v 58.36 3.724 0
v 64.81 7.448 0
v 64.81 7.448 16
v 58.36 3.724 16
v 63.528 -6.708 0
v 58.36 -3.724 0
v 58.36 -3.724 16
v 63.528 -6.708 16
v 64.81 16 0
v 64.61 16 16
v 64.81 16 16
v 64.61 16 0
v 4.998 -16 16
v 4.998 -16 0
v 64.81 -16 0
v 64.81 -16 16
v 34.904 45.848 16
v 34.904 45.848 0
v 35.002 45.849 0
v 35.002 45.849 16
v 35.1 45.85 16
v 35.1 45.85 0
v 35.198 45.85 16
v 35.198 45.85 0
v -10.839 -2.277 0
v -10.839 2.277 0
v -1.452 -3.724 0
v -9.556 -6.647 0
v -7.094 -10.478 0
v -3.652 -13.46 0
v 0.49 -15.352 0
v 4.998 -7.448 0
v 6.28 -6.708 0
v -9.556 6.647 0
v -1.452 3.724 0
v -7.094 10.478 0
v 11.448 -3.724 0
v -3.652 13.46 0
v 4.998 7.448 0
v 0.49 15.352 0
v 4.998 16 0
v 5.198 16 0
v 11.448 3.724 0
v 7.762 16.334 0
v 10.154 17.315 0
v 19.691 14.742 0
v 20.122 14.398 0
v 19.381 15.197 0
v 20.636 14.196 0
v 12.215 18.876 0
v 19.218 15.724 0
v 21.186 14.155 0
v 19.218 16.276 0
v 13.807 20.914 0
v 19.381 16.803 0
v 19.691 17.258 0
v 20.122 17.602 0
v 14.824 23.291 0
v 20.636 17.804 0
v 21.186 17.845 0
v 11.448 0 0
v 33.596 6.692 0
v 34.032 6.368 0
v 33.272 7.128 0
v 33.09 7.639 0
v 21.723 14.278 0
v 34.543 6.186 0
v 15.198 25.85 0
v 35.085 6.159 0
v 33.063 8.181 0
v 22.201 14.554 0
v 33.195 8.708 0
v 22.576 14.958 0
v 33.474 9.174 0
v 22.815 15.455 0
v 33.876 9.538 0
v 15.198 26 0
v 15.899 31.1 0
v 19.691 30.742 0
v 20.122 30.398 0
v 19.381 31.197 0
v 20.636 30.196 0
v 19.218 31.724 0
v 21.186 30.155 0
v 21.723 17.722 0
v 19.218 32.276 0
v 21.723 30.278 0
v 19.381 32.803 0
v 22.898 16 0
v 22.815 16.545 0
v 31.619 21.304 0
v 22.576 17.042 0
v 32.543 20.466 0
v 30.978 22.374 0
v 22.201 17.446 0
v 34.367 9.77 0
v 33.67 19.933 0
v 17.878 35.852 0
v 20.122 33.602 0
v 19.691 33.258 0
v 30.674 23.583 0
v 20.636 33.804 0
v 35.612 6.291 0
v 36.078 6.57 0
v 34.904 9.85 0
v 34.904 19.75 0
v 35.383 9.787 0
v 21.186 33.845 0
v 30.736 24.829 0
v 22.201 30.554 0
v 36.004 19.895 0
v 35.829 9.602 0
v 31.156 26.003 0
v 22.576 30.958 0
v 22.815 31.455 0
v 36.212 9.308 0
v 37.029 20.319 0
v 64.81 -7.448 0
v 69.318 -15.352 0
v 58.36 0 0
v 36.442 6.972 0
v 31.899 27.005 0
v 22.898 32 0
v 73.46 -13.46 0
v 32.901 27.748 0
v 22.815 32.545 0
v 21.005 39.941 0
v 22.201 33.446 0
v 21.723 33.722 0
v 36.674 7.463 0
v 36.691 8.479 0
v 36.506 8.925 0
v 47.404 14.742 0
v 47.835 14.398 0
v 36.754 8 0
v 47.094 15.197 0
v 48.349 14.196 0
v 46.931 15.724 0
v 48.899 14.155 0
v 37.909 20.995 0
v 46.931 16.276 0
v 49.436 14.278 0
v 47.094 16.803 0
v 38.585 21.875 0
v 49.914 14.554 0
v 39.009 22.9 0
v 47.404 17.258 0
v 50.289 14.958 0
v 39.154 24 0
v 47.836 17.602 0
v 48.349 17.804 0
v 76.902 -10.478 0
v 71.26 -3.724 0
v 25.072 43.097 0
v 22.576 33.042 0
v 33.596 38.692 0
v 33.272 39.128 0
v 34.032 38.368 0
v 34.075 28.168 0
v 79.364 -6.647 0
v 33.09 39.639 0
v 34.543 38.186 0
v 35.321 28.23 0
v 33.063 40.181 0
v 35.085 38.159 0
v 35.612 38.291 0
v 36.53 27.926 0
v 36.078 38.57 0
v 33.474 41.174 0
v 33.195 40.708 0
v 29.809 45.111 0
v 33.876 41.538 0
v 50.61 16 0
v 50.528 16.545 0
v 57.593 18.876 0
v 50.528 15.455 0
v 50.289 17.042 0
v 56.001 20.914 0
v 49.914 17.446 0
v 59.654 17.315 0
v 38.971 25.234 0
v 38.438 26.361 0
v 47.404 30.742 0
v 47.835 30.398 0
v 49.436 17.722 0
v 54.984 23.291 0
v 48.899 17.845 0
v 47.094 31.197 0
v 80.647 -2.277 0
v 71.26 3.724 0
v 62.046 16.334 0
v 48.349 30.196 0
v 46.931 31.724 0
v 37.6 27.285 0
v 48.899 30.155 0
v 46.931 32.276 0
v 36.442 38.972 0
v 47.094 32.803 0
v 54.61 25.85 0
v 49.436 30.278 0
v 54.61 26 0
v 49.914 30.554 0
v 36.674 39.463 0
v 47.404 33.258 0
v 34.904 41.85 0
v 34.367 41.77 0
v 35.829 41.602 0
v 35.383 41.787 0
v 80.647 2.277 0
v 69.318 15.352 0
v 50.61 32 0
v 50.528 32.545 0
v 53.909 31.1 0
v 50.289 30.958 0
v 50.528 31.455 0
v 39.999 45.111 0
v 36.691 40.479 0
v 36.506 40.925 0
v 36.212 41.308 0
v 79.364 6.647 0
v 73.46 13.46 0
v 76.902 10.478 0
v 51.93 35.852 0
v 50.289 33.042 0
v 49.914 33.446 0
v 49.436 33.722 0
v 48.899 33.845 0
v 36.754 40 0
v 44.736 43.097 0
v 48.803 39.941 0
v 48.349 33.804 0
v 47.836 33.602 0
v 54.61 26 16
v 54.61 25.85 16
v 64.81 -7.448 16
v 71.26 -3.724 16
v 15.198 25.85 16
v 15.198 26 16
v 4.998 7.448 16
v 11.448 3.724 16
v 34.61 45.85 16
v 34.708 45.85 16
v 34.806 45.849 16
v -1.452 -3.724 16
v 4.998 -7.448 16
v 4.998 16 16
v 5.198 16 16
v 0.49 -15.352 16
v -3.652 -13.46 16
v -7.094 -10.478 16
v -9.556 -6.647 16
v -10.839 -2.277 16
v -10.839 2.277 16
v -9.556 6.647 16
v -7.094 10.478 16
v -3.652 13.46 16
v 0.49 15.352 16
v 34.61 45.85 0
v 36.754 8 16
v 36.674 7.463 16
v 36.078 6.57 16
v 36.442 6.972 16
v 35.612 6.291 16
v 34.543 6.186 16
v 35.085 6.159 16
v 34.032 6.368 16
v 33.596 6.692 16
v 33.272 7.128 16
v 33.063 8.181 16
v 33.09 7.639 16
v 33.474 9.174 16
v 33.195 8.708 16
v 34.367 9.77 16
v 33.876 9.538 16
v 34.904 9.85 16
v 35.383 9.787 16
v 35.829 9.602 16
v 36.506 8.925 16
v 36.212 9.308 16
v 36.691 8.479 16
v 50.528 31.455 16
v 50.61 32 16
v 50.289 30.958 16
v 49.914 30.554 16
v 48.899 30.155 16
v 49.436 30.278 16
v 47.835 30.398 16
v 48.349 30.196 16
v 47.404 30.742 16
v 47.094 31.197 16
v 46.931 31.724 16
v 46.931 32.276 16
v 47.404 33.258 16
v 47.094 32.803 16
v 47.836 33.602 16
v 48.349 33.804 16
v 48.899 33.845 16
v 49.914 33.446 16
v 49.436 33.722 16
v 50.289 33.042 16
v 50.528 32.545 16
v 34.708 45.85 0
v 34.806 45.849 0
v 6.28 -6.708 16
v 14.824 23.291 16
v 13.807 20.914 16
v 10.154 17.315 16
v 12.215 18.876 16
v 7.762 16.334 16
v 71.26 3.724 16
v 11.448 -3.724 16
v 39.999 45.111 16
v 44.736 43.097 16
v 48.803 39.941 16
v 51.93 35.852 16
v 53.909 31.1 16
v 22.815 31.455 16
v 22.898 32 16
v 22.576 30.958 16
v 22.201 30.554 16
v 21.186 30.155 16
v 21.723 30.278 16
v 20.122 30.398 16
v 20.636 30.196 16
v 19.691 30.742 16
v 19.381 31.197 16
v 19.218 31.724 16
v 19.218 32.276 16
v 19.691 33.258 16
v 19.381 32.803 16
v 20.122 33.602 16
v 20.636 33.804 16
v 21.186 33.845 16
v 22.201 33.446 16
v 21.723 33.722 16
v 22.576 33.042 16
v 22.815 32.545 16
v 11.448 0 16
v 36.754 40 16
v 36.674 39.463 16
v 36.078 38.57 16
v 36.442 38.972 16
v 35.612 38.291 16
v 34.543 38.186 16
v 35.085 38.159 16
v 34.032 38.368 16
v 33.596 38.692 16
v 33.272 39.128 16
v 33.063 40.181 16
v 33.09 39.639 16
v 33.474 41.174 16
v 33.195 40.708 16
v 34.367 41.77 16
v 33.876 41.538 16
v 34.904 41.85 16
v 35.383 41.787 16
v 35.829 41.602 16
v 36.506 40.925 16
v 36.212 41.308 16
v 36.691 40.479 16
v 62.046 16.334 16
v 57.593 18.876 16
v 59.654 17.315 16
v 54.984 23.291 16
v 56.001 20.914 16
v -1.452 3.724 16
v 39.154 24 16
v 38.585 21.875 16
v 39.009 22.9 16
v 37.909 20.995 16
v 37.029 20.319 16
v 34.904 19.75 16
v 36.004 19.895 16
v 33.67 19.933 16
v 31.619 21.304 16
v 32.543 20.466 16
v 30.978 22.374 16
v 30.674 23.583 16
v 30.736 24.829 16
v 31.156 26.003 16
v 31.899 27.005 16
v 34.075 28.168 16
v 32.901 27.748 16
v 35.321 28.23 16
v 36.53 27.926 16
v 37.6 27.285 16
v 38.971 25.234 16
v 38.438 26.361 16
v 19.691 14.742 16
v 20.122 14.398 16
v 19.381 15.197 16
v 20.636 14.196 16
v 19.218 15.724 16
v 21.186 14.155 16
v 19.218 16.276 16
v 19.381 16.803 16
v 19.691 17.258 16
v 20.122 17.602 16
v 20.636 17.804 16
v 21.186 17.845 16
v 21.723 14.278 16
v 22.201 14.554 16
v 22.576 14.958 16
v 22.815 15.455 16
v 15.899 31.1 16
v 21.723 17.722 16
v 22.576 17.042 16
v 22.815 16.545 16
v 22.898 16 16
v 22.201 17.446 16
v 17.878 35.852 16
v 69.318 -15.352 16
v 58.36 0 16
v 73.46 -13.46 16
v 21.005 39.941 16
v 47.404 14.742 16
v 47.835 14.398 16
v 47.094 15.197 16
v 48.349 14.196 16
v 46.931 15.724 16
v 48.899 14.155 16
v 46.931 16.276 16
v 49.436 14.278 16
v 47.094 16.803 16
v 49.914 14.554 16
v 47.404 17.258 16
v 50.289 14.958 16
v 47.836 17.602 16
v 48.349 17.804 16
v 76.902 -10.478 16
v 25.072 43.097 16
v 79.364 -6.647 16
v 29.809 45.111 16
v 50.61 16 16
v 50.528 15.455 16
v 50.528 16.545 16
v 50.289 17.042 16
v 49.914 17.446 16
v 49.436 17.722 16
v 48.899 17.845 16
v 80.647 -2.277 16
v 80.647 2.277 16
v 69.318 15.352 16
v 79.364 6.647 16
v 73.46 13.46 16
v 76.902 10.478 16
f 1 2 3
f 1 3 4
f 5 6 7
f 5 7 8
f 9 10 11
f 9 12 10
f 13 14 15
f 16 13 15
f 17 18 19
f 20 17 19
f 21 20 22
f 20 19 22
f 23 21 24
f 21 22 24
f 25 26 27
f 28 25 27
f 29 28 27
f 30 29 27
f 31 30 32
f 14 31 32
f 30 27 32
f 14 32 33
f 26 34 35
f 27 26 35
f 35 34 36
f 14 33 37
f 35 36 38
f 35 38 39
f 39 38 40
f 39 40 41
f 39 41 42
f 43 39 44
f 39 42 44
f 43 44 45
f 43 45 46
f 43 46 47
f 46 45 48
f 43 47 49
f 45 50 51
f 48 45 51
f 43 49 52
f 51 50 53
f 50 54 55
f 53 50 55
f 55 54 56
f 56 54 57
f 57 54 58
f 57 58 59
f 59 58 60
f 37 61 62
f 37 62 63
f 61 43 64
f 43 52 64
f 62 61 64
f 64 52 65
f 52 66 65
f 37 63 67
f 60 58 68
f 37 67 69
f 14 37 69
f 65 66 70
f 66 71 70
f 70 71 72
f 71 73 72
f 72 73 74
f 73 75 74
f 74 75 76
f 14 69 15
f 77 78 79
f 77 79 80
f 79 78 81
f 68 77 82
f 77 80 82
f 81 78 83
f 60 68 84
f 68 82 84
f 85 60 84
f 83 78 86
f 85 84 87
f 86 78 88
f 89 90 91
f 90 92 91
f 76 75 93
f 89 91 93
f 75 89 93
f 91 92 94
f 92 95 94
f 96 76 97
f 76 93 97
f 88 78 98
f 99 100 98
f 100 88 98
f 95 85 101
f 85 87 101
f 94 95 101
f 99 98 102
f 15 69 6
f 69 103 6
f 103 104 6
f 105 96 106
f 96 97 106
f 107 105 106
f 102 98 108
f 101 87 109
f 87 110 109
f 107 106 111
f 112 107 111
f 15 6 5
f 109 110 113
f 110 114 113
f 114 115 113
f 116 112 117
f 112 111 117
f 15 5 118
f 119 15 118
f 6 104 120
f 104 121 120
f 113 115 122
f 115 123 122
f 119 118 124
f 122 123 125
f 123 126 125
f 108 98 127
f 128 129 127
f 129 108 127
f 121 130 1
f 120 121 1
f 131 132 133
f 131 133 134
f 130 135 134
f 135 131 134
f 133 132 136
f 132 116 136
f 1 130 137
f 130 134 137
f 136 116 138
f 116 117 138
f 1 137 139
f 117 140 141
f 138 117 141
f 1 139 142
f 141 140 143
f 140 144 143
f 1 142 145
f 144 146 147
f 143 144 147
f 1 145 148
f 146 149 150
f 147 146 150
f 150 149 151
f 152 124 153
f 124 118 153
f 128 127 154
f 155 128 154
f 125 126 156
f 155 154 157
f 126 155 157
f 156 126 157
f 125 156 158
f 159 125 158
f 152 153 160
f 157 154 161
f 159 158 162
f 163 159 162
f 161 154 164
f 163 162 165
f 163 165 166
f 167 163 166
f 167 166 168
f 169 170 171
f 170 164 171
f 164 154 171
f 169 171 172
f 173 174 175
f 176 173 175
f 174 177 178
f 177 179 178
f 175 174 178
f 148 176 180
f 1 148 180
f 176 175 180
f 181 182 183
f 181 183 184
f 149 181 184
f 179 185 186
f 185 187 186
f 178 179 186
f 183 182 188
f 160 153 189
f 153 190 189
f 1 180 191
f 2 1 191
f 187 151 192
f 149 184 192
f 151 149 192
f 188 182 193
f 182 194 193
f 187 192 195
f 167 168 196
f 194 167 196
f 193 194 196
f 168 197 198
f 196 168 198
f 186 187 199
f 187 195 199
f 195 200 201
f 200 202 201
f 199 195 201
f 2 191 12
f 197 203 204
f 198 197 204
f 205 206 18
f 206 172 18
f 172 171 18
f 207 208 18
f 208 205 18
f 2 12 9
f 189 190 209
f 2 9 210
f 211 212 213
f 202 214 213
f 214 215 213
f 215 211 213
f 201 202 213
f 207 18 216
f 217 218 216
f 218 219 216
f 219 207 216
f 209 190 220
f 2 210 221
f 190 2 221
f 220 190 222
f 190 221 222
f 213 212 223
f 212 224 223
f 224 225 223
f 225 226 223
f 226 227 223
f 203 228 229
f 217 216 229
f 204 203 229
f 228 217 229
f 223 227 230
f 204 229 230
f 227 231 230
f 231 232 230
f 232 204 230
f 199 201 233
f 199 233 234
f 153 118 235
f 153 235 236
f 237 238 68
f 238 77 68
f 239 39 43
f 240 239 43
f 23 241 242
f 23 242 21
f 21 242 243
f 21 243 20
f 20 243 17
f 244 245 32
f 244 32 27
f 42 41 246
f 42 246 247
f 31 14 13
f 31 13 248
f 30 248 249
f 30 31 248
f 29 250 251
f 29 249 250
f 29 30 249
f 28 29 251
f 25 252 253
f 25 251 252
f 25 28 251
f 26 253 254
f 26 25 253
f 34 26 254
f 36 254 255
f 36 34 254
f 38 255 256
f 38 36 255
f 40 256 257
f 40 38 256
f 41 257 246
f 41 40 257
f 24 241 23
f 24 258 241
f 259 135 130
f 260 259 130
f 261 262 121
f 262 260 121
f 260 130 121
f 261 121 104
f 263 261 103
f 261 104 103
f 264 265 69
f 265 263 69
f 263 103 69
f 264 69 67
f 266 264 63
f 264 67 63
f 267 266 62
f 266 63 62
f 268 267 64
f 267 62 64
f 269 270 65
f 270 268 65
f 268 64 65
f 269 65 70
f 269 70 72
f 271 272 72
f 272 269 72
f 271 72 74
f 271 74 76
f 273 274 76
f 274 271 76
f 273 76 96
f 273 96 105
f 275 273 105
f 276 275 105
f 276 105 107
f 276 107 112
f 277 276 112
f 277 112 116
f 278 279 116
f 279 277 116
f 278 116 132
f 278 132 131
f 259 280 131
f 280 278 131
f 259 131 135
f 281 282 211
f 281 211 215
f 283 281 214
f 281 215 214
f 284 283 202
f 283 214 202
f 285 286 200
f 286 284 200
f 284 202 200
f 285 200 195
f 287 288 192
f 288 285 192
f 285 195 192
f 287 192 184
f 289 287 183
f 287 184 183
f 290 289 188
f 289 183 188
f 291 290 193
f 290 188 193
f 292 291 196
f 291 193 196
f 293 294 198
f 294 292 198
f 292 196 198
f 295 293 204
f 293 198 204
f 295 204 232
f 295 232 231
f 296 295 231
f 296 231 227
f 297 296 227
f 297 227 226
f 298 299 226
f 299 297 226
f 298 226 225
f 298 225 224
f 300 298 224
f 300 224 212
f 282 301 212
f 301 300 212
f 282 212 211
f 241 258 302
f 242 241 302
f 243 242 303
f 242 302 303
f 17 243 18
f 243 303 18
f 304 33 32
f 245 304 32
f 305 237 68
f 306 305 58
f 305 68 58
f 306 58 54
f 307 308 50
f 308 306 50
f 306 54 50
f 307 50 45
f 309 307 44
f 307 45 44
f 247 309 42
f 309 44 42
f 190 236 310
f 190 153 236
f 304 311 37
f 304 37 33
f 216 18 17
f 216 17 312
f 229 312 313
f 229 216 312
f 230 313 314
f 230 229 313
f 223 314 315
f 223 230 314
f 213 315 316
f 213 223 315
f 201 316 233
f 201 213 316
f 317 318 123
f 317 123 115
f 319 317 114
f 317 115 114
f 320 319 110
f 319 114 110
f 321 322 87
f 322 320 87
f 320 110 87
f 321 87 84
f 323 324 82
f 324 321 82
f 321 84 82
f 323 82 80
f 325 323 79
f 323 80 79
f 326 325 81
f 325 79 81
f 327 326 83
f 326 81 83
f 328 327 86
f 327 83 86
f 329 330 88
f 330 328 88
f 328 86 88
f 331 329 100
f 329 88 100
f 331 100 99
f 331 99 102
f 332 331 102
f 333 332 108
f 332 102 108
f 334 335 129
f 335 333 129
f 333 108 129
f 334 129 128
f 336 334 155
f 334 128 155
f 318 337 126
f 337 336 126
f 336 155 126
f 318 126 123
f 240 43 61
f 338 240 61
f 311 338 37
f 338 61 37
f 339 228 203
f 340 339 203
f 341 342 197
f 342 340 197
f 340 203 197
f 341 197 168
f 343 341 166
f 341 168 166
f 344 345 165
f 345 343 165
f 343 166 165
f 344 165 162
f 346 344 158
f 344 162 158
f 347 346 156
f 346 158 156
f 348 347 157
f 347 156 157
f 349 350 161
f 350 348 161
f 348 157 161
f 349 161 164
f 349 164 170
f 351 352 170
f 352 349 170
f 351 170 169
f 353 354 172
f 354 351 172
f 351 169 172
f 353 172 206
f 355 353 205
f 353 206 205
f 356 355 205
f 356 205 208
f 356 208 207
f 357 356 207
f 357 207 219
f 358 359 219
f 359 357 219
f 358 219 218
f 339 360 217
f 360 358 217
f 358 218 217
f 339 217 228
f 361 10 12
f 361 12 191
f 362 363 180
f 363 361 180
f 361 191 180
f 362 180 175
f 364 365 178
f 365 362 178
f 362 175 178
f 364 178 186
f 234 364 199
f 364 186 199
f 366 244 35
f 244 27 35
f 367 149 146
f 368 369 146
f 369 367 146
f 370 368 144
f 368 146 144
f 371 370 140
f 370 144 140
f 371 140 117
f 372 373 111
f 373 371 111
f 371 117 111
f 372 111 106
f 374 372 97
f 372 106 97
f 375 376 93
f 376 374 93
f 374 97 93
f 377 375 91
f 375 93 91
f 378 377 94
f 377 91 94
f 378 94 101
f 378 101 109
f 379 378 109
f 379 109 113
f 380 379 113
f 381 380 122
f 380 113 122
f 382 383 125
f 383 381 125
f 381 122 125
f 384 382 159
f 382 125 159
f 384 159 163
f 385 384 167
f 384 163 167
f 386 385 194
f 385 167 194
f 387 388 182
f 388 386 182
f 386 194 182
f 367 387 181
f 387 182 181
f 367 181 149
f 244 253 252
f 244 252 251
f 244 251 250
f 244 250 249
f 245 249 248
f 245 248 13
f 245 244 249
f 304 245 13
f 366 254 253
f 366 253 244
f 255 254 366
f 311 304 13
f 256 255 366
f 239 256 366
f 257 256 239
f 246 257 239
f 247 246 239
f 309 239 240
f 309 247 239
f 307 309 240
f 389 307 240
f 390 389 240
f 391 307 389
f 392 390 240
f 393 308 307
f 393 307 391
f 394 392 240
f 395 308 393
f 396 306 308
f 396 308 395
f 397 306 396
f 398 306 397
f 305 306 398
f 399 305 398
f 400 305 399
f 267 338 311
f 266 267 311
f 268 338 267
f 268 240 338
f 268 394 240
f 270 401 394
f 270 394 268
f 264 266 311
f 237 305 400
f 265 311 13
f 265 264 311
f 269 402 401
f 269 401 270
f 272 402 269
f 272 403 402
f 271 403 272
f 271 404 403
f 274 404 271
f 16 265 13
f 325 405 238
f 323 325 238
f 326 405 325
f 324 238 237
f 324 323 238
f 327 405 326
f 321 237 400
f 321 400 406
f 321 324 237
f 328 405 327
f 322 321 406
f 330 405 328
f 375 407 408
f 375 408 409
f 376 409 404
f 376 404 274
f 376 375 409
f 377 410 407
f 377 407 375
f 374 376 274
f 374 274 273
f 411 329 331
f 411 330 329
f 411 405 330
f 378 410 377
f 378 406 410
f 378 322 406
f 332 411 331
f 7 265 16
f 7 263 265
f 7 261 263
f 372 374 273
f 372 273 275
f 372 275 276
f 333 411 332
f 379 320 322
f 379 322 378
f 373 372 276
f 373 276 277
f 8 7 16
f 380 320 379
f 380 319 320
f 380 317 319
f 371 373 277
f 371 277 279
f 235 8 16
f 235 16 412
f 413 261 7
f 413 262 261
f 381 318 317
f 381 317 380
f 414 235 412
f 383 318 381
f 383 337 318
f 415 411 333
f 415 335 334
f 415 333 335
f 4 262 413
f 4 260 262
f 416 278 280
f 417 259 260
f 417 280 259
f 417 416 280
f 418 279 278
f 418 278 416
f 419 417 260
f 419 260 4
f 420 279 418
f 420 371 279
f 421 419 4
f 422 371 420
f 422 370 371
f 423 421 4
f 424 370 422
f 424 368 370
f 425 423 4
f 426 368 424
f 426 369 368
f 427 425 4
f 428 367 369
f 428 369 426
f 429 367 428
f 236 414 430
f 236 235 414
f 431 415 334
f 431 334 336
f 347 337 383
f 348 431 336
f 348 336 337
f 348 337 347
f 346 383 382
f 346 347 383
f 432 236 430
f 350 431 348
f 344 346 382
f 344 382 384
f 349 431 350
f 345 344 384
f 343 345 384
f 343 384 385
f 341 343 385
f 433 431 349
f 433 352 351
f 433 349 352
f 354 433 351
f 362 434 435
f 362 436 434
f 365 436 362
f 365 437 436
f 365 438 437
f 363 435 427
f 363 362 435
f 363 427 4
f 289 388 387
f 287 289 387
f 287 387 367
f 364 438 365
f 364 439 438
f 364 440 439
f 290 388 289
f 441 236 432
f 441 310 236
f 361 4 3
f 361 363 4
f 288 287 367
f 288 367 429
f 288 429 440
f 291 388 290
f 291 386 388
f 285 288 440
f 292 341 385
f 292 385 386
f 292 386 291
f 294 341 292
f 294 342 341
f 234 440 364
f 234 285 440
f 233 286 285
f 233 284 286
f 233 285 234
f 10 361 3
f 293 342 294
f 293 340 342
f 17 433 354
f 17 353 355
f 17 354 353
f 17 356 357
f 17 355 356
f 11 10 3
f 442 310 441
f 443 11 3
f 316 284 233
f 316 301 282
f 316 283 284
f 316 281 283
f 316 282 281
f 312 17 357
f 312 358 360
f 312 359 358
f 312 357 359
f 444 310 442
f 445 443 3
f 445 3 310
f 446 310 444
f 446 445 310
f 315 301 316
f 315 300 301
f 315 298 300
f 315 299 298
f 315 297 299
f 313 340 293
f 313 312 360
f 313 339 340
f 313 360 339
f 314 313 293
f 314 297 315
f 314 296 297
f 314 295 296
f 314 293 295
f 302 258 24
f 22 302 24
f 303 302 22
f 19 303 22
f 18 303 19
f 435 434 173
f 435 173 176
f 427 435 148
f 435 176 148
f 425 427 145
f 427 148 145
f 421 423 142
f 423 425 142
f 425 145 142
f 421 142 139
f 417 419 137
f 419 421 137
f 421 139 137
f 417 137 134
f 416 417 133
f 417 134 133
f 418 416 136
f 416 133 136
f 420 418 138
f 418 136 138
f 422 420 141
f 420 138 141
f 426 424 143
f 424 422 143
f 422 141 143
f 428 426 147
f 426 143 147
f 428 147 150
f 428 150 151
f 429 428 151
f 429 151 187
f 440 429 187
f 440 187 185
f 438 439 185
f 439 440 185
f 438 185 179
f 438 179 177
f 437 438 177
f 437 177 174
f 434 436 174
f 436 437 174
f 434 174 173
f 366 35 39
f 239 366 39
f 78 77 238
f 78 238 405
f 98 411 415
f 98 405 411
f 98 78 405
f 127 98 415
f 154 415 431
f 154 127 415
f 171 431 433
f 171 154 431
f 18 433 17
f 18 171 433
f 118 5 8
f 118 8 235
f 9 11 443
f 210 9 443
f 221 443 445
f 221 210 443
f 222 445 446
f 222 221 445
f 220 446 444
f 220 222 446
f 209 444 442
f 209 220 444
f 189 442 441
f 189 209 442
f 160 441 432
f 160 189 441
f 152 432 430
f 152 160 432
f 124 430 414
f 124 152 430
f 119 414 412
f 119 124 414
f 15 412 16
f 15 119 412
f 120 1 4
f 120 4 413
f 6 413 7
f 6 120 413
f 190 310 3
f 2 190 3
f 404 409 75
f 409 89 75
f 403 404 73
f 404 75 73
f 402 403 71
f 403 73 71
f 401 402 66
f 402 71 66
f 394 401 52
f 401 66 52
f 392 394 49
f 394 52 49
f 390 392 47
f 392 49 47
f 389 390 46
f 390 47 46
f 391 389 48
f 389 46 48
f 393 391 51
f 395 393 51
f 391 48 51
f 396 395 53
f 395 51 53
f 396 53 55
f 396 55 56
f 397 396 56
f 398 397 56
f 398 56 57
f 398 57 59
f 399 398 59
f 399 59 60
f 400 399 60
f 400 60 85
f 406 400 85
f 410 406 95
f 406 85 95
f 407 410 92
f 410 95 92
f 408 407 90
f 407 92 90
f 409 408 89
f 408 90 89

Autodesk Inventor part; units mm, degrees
ref_plane "YZ Plane" through (0, 0, 0) normal (1, 0, 0) x (0, 1, 0)
ref_plane "XZ Plane" through (0, 0, 0) normal (0, 1, 0) x (-1, 0, 0)
ref_plane "XY Plane" through (0, 0, 0) normal (0, 0, 1) x (1, 0, 0)
sketch "Sketch7" plane through (0, 0, 0) normal (0, 0, 1) x (1, 0, 0)
  line L0 (64.7605, 16) -> (64.8102, 16)
  circle A0 centre (34.904, 8) radius 1.85
  line L1 (34.904, 0) -> (21.0475, 0)
  circle A1 centre (21.0475, 32) radius 1.85
  circle A2 centre (48.7605, 32) radius 1.85
  circle A3 centre (48.7605, 16) radius 1.85
  circle A4 centre (21.0475, 16) radius 1.85
  line L2 (34.904, -16) -> (33.054, -16)
  line L3 (4.9978, -16) -> (29.0539, -16)
  line L4 (44.974, -16) -> (64.8102, -16)
  circle A5 centre (34.904, 40) radius 1.85
  line L5 (4.9978, 16) -> (5.1975, 16)
  line L6 (64.6105, 16) -> (64.8102, 16)
  line L7 (34.904, 8) -> (34.904, 24)
  circle A6 centre (34.904, 24) radius 4.25
  line L8 (29.0539, -16) -> (44.974, -16)
  line L9 (34.904, 40) -> (34.904, 41.85)
  line L10 (34.904, 41.85) -> (34.904, 45.85)
  line L11 (21.0475, 16) -> (19.1975, 16)
  line L12 (19.1975, 16) -> (15.1975, 16)
  line L13 (48.7605, 16) -> (50.6105, 16)
  line L14 (15.1975, 26) -> (15.1975, 25.85)
  line L15 (35.1975, 45.85) -> (34.904, 45.85)
  line L16 (54.6105, 26) -> (54.6105, 25.85)
  line L17 (34.6105, 45.85) -> (34.904, 45.85)
  arc A7 (35.1975, 45.85) -> (15.1975, 25.85) centre (35.1975, 25.85) ccw
  arc A8 (54.6105, 25.85) -> (34.6105, 45.85) centre (34.6105, 25.85) ccw
  arc A9 (5.1975, 16) -> (15.1975, 26) centre (5.1975, 26) ccw
  arc A10 (54.6105, 26) -> (64.6105, 16) centre (64.6105, 26) ccw
  line L18 (48.8102, 0) -> (58.36, 0)
  line L19 (58.36, 0) -> (48.8102, 0)
  line L20 (11.448, 3.724) -> (11.448, -3.724)
  line L21 (11.448, 3.724) -> (18.896, 3.724) construction
  line L22 (11.448, 3.724) -> (18.896, 3.724) construction
  line L23 (11.448, -3.724) -> (6.2803, -6.7076)
  line L24 (11.448, -3.724) -> (17.4152, -3.724) construction
  line L25 (11.448, -3.724) -> (4.9978, -7.448)
  line L26 (4.9978, -7.448) -> (-1.4523, -3.724)
  line L27 (-1.4523, -3.724) -> (-1.4523, 3.724)
  line L28 (-1.4523, 3.724) -> (4.9978, 7.448)
  line L29 (4.9978, 7.448) -> (11.448, 3.724)
  line L30 (11.448, 0) -> (48.8102, 0)
  line L31 (58.36, 3.724) -> (58.36, -3.724)
  line L32 (58.36, 3.724) -> (50.912, 3.724) construction
  line L33 (58.36, 3.724) -> (50.912, 3.724) construction
  line L34 (58.36, -3.724) -> (63.5277, -6.7076)
  line L35 (58.36, -3.724) -> (52.3928, -3.724) construction
  line L36 (58.36, -3.724) -> (64.8102, -7.448)
  line L37 (64.8102, -7.448) -> (71.2603, -3.724)
  line L38 (71.2603, -3.724) -> (71.2603, 3.724)
  line L39 (71.2603, 3.724) -> (64.8102, 7.448)
  line L40 (64.8102, 7.448) -> (58.36, 3.724)
  line L41 (4.9978, 7.448) -> (4.9978, 0)
  arc A11 (4.9978, 16) -> (4.9978, -16) centre (4.9978, 0) ccw
  line L42 (64.8102, 7.448) -> (64.8102, 0)
  arc A12 (48.8102, 0) -> (64.8102, 16) centre (64.8102, 0) ccw
  point P0 (54.6105, 45.85)
  point P1 (34.904, 45.8479)
  point P2 (34.904, 45.8479)
  point P3 (69.808, 16)
  point P4 (11.448, 0)
  point P5 (34.904, 45.8479)
  point P6 (58.36, 0)
  dimension "d83" = 16
  dimension "d84" = 8.5
  dimension "d85" = 4
  dimension "d86" = 4
  dimension "d88" = 20
  dimension "d89" = 10
  dimension "d93" = 23.456
  dimension "d94" = 46.912
  dimension "d96" = 7.448
  dimension "d105" = 150
  dimension "d106" = 7.448
  dimension "d107" = 7.448
  dimension "d108" = 120
  dimension "d109" = 7.448
  dimension "d110" = 7.448
  dimension "d111" = 32
  dimension "d112" = 32
extrude "Extrusion3" add sketch "Sketch7" along normal blind 16
